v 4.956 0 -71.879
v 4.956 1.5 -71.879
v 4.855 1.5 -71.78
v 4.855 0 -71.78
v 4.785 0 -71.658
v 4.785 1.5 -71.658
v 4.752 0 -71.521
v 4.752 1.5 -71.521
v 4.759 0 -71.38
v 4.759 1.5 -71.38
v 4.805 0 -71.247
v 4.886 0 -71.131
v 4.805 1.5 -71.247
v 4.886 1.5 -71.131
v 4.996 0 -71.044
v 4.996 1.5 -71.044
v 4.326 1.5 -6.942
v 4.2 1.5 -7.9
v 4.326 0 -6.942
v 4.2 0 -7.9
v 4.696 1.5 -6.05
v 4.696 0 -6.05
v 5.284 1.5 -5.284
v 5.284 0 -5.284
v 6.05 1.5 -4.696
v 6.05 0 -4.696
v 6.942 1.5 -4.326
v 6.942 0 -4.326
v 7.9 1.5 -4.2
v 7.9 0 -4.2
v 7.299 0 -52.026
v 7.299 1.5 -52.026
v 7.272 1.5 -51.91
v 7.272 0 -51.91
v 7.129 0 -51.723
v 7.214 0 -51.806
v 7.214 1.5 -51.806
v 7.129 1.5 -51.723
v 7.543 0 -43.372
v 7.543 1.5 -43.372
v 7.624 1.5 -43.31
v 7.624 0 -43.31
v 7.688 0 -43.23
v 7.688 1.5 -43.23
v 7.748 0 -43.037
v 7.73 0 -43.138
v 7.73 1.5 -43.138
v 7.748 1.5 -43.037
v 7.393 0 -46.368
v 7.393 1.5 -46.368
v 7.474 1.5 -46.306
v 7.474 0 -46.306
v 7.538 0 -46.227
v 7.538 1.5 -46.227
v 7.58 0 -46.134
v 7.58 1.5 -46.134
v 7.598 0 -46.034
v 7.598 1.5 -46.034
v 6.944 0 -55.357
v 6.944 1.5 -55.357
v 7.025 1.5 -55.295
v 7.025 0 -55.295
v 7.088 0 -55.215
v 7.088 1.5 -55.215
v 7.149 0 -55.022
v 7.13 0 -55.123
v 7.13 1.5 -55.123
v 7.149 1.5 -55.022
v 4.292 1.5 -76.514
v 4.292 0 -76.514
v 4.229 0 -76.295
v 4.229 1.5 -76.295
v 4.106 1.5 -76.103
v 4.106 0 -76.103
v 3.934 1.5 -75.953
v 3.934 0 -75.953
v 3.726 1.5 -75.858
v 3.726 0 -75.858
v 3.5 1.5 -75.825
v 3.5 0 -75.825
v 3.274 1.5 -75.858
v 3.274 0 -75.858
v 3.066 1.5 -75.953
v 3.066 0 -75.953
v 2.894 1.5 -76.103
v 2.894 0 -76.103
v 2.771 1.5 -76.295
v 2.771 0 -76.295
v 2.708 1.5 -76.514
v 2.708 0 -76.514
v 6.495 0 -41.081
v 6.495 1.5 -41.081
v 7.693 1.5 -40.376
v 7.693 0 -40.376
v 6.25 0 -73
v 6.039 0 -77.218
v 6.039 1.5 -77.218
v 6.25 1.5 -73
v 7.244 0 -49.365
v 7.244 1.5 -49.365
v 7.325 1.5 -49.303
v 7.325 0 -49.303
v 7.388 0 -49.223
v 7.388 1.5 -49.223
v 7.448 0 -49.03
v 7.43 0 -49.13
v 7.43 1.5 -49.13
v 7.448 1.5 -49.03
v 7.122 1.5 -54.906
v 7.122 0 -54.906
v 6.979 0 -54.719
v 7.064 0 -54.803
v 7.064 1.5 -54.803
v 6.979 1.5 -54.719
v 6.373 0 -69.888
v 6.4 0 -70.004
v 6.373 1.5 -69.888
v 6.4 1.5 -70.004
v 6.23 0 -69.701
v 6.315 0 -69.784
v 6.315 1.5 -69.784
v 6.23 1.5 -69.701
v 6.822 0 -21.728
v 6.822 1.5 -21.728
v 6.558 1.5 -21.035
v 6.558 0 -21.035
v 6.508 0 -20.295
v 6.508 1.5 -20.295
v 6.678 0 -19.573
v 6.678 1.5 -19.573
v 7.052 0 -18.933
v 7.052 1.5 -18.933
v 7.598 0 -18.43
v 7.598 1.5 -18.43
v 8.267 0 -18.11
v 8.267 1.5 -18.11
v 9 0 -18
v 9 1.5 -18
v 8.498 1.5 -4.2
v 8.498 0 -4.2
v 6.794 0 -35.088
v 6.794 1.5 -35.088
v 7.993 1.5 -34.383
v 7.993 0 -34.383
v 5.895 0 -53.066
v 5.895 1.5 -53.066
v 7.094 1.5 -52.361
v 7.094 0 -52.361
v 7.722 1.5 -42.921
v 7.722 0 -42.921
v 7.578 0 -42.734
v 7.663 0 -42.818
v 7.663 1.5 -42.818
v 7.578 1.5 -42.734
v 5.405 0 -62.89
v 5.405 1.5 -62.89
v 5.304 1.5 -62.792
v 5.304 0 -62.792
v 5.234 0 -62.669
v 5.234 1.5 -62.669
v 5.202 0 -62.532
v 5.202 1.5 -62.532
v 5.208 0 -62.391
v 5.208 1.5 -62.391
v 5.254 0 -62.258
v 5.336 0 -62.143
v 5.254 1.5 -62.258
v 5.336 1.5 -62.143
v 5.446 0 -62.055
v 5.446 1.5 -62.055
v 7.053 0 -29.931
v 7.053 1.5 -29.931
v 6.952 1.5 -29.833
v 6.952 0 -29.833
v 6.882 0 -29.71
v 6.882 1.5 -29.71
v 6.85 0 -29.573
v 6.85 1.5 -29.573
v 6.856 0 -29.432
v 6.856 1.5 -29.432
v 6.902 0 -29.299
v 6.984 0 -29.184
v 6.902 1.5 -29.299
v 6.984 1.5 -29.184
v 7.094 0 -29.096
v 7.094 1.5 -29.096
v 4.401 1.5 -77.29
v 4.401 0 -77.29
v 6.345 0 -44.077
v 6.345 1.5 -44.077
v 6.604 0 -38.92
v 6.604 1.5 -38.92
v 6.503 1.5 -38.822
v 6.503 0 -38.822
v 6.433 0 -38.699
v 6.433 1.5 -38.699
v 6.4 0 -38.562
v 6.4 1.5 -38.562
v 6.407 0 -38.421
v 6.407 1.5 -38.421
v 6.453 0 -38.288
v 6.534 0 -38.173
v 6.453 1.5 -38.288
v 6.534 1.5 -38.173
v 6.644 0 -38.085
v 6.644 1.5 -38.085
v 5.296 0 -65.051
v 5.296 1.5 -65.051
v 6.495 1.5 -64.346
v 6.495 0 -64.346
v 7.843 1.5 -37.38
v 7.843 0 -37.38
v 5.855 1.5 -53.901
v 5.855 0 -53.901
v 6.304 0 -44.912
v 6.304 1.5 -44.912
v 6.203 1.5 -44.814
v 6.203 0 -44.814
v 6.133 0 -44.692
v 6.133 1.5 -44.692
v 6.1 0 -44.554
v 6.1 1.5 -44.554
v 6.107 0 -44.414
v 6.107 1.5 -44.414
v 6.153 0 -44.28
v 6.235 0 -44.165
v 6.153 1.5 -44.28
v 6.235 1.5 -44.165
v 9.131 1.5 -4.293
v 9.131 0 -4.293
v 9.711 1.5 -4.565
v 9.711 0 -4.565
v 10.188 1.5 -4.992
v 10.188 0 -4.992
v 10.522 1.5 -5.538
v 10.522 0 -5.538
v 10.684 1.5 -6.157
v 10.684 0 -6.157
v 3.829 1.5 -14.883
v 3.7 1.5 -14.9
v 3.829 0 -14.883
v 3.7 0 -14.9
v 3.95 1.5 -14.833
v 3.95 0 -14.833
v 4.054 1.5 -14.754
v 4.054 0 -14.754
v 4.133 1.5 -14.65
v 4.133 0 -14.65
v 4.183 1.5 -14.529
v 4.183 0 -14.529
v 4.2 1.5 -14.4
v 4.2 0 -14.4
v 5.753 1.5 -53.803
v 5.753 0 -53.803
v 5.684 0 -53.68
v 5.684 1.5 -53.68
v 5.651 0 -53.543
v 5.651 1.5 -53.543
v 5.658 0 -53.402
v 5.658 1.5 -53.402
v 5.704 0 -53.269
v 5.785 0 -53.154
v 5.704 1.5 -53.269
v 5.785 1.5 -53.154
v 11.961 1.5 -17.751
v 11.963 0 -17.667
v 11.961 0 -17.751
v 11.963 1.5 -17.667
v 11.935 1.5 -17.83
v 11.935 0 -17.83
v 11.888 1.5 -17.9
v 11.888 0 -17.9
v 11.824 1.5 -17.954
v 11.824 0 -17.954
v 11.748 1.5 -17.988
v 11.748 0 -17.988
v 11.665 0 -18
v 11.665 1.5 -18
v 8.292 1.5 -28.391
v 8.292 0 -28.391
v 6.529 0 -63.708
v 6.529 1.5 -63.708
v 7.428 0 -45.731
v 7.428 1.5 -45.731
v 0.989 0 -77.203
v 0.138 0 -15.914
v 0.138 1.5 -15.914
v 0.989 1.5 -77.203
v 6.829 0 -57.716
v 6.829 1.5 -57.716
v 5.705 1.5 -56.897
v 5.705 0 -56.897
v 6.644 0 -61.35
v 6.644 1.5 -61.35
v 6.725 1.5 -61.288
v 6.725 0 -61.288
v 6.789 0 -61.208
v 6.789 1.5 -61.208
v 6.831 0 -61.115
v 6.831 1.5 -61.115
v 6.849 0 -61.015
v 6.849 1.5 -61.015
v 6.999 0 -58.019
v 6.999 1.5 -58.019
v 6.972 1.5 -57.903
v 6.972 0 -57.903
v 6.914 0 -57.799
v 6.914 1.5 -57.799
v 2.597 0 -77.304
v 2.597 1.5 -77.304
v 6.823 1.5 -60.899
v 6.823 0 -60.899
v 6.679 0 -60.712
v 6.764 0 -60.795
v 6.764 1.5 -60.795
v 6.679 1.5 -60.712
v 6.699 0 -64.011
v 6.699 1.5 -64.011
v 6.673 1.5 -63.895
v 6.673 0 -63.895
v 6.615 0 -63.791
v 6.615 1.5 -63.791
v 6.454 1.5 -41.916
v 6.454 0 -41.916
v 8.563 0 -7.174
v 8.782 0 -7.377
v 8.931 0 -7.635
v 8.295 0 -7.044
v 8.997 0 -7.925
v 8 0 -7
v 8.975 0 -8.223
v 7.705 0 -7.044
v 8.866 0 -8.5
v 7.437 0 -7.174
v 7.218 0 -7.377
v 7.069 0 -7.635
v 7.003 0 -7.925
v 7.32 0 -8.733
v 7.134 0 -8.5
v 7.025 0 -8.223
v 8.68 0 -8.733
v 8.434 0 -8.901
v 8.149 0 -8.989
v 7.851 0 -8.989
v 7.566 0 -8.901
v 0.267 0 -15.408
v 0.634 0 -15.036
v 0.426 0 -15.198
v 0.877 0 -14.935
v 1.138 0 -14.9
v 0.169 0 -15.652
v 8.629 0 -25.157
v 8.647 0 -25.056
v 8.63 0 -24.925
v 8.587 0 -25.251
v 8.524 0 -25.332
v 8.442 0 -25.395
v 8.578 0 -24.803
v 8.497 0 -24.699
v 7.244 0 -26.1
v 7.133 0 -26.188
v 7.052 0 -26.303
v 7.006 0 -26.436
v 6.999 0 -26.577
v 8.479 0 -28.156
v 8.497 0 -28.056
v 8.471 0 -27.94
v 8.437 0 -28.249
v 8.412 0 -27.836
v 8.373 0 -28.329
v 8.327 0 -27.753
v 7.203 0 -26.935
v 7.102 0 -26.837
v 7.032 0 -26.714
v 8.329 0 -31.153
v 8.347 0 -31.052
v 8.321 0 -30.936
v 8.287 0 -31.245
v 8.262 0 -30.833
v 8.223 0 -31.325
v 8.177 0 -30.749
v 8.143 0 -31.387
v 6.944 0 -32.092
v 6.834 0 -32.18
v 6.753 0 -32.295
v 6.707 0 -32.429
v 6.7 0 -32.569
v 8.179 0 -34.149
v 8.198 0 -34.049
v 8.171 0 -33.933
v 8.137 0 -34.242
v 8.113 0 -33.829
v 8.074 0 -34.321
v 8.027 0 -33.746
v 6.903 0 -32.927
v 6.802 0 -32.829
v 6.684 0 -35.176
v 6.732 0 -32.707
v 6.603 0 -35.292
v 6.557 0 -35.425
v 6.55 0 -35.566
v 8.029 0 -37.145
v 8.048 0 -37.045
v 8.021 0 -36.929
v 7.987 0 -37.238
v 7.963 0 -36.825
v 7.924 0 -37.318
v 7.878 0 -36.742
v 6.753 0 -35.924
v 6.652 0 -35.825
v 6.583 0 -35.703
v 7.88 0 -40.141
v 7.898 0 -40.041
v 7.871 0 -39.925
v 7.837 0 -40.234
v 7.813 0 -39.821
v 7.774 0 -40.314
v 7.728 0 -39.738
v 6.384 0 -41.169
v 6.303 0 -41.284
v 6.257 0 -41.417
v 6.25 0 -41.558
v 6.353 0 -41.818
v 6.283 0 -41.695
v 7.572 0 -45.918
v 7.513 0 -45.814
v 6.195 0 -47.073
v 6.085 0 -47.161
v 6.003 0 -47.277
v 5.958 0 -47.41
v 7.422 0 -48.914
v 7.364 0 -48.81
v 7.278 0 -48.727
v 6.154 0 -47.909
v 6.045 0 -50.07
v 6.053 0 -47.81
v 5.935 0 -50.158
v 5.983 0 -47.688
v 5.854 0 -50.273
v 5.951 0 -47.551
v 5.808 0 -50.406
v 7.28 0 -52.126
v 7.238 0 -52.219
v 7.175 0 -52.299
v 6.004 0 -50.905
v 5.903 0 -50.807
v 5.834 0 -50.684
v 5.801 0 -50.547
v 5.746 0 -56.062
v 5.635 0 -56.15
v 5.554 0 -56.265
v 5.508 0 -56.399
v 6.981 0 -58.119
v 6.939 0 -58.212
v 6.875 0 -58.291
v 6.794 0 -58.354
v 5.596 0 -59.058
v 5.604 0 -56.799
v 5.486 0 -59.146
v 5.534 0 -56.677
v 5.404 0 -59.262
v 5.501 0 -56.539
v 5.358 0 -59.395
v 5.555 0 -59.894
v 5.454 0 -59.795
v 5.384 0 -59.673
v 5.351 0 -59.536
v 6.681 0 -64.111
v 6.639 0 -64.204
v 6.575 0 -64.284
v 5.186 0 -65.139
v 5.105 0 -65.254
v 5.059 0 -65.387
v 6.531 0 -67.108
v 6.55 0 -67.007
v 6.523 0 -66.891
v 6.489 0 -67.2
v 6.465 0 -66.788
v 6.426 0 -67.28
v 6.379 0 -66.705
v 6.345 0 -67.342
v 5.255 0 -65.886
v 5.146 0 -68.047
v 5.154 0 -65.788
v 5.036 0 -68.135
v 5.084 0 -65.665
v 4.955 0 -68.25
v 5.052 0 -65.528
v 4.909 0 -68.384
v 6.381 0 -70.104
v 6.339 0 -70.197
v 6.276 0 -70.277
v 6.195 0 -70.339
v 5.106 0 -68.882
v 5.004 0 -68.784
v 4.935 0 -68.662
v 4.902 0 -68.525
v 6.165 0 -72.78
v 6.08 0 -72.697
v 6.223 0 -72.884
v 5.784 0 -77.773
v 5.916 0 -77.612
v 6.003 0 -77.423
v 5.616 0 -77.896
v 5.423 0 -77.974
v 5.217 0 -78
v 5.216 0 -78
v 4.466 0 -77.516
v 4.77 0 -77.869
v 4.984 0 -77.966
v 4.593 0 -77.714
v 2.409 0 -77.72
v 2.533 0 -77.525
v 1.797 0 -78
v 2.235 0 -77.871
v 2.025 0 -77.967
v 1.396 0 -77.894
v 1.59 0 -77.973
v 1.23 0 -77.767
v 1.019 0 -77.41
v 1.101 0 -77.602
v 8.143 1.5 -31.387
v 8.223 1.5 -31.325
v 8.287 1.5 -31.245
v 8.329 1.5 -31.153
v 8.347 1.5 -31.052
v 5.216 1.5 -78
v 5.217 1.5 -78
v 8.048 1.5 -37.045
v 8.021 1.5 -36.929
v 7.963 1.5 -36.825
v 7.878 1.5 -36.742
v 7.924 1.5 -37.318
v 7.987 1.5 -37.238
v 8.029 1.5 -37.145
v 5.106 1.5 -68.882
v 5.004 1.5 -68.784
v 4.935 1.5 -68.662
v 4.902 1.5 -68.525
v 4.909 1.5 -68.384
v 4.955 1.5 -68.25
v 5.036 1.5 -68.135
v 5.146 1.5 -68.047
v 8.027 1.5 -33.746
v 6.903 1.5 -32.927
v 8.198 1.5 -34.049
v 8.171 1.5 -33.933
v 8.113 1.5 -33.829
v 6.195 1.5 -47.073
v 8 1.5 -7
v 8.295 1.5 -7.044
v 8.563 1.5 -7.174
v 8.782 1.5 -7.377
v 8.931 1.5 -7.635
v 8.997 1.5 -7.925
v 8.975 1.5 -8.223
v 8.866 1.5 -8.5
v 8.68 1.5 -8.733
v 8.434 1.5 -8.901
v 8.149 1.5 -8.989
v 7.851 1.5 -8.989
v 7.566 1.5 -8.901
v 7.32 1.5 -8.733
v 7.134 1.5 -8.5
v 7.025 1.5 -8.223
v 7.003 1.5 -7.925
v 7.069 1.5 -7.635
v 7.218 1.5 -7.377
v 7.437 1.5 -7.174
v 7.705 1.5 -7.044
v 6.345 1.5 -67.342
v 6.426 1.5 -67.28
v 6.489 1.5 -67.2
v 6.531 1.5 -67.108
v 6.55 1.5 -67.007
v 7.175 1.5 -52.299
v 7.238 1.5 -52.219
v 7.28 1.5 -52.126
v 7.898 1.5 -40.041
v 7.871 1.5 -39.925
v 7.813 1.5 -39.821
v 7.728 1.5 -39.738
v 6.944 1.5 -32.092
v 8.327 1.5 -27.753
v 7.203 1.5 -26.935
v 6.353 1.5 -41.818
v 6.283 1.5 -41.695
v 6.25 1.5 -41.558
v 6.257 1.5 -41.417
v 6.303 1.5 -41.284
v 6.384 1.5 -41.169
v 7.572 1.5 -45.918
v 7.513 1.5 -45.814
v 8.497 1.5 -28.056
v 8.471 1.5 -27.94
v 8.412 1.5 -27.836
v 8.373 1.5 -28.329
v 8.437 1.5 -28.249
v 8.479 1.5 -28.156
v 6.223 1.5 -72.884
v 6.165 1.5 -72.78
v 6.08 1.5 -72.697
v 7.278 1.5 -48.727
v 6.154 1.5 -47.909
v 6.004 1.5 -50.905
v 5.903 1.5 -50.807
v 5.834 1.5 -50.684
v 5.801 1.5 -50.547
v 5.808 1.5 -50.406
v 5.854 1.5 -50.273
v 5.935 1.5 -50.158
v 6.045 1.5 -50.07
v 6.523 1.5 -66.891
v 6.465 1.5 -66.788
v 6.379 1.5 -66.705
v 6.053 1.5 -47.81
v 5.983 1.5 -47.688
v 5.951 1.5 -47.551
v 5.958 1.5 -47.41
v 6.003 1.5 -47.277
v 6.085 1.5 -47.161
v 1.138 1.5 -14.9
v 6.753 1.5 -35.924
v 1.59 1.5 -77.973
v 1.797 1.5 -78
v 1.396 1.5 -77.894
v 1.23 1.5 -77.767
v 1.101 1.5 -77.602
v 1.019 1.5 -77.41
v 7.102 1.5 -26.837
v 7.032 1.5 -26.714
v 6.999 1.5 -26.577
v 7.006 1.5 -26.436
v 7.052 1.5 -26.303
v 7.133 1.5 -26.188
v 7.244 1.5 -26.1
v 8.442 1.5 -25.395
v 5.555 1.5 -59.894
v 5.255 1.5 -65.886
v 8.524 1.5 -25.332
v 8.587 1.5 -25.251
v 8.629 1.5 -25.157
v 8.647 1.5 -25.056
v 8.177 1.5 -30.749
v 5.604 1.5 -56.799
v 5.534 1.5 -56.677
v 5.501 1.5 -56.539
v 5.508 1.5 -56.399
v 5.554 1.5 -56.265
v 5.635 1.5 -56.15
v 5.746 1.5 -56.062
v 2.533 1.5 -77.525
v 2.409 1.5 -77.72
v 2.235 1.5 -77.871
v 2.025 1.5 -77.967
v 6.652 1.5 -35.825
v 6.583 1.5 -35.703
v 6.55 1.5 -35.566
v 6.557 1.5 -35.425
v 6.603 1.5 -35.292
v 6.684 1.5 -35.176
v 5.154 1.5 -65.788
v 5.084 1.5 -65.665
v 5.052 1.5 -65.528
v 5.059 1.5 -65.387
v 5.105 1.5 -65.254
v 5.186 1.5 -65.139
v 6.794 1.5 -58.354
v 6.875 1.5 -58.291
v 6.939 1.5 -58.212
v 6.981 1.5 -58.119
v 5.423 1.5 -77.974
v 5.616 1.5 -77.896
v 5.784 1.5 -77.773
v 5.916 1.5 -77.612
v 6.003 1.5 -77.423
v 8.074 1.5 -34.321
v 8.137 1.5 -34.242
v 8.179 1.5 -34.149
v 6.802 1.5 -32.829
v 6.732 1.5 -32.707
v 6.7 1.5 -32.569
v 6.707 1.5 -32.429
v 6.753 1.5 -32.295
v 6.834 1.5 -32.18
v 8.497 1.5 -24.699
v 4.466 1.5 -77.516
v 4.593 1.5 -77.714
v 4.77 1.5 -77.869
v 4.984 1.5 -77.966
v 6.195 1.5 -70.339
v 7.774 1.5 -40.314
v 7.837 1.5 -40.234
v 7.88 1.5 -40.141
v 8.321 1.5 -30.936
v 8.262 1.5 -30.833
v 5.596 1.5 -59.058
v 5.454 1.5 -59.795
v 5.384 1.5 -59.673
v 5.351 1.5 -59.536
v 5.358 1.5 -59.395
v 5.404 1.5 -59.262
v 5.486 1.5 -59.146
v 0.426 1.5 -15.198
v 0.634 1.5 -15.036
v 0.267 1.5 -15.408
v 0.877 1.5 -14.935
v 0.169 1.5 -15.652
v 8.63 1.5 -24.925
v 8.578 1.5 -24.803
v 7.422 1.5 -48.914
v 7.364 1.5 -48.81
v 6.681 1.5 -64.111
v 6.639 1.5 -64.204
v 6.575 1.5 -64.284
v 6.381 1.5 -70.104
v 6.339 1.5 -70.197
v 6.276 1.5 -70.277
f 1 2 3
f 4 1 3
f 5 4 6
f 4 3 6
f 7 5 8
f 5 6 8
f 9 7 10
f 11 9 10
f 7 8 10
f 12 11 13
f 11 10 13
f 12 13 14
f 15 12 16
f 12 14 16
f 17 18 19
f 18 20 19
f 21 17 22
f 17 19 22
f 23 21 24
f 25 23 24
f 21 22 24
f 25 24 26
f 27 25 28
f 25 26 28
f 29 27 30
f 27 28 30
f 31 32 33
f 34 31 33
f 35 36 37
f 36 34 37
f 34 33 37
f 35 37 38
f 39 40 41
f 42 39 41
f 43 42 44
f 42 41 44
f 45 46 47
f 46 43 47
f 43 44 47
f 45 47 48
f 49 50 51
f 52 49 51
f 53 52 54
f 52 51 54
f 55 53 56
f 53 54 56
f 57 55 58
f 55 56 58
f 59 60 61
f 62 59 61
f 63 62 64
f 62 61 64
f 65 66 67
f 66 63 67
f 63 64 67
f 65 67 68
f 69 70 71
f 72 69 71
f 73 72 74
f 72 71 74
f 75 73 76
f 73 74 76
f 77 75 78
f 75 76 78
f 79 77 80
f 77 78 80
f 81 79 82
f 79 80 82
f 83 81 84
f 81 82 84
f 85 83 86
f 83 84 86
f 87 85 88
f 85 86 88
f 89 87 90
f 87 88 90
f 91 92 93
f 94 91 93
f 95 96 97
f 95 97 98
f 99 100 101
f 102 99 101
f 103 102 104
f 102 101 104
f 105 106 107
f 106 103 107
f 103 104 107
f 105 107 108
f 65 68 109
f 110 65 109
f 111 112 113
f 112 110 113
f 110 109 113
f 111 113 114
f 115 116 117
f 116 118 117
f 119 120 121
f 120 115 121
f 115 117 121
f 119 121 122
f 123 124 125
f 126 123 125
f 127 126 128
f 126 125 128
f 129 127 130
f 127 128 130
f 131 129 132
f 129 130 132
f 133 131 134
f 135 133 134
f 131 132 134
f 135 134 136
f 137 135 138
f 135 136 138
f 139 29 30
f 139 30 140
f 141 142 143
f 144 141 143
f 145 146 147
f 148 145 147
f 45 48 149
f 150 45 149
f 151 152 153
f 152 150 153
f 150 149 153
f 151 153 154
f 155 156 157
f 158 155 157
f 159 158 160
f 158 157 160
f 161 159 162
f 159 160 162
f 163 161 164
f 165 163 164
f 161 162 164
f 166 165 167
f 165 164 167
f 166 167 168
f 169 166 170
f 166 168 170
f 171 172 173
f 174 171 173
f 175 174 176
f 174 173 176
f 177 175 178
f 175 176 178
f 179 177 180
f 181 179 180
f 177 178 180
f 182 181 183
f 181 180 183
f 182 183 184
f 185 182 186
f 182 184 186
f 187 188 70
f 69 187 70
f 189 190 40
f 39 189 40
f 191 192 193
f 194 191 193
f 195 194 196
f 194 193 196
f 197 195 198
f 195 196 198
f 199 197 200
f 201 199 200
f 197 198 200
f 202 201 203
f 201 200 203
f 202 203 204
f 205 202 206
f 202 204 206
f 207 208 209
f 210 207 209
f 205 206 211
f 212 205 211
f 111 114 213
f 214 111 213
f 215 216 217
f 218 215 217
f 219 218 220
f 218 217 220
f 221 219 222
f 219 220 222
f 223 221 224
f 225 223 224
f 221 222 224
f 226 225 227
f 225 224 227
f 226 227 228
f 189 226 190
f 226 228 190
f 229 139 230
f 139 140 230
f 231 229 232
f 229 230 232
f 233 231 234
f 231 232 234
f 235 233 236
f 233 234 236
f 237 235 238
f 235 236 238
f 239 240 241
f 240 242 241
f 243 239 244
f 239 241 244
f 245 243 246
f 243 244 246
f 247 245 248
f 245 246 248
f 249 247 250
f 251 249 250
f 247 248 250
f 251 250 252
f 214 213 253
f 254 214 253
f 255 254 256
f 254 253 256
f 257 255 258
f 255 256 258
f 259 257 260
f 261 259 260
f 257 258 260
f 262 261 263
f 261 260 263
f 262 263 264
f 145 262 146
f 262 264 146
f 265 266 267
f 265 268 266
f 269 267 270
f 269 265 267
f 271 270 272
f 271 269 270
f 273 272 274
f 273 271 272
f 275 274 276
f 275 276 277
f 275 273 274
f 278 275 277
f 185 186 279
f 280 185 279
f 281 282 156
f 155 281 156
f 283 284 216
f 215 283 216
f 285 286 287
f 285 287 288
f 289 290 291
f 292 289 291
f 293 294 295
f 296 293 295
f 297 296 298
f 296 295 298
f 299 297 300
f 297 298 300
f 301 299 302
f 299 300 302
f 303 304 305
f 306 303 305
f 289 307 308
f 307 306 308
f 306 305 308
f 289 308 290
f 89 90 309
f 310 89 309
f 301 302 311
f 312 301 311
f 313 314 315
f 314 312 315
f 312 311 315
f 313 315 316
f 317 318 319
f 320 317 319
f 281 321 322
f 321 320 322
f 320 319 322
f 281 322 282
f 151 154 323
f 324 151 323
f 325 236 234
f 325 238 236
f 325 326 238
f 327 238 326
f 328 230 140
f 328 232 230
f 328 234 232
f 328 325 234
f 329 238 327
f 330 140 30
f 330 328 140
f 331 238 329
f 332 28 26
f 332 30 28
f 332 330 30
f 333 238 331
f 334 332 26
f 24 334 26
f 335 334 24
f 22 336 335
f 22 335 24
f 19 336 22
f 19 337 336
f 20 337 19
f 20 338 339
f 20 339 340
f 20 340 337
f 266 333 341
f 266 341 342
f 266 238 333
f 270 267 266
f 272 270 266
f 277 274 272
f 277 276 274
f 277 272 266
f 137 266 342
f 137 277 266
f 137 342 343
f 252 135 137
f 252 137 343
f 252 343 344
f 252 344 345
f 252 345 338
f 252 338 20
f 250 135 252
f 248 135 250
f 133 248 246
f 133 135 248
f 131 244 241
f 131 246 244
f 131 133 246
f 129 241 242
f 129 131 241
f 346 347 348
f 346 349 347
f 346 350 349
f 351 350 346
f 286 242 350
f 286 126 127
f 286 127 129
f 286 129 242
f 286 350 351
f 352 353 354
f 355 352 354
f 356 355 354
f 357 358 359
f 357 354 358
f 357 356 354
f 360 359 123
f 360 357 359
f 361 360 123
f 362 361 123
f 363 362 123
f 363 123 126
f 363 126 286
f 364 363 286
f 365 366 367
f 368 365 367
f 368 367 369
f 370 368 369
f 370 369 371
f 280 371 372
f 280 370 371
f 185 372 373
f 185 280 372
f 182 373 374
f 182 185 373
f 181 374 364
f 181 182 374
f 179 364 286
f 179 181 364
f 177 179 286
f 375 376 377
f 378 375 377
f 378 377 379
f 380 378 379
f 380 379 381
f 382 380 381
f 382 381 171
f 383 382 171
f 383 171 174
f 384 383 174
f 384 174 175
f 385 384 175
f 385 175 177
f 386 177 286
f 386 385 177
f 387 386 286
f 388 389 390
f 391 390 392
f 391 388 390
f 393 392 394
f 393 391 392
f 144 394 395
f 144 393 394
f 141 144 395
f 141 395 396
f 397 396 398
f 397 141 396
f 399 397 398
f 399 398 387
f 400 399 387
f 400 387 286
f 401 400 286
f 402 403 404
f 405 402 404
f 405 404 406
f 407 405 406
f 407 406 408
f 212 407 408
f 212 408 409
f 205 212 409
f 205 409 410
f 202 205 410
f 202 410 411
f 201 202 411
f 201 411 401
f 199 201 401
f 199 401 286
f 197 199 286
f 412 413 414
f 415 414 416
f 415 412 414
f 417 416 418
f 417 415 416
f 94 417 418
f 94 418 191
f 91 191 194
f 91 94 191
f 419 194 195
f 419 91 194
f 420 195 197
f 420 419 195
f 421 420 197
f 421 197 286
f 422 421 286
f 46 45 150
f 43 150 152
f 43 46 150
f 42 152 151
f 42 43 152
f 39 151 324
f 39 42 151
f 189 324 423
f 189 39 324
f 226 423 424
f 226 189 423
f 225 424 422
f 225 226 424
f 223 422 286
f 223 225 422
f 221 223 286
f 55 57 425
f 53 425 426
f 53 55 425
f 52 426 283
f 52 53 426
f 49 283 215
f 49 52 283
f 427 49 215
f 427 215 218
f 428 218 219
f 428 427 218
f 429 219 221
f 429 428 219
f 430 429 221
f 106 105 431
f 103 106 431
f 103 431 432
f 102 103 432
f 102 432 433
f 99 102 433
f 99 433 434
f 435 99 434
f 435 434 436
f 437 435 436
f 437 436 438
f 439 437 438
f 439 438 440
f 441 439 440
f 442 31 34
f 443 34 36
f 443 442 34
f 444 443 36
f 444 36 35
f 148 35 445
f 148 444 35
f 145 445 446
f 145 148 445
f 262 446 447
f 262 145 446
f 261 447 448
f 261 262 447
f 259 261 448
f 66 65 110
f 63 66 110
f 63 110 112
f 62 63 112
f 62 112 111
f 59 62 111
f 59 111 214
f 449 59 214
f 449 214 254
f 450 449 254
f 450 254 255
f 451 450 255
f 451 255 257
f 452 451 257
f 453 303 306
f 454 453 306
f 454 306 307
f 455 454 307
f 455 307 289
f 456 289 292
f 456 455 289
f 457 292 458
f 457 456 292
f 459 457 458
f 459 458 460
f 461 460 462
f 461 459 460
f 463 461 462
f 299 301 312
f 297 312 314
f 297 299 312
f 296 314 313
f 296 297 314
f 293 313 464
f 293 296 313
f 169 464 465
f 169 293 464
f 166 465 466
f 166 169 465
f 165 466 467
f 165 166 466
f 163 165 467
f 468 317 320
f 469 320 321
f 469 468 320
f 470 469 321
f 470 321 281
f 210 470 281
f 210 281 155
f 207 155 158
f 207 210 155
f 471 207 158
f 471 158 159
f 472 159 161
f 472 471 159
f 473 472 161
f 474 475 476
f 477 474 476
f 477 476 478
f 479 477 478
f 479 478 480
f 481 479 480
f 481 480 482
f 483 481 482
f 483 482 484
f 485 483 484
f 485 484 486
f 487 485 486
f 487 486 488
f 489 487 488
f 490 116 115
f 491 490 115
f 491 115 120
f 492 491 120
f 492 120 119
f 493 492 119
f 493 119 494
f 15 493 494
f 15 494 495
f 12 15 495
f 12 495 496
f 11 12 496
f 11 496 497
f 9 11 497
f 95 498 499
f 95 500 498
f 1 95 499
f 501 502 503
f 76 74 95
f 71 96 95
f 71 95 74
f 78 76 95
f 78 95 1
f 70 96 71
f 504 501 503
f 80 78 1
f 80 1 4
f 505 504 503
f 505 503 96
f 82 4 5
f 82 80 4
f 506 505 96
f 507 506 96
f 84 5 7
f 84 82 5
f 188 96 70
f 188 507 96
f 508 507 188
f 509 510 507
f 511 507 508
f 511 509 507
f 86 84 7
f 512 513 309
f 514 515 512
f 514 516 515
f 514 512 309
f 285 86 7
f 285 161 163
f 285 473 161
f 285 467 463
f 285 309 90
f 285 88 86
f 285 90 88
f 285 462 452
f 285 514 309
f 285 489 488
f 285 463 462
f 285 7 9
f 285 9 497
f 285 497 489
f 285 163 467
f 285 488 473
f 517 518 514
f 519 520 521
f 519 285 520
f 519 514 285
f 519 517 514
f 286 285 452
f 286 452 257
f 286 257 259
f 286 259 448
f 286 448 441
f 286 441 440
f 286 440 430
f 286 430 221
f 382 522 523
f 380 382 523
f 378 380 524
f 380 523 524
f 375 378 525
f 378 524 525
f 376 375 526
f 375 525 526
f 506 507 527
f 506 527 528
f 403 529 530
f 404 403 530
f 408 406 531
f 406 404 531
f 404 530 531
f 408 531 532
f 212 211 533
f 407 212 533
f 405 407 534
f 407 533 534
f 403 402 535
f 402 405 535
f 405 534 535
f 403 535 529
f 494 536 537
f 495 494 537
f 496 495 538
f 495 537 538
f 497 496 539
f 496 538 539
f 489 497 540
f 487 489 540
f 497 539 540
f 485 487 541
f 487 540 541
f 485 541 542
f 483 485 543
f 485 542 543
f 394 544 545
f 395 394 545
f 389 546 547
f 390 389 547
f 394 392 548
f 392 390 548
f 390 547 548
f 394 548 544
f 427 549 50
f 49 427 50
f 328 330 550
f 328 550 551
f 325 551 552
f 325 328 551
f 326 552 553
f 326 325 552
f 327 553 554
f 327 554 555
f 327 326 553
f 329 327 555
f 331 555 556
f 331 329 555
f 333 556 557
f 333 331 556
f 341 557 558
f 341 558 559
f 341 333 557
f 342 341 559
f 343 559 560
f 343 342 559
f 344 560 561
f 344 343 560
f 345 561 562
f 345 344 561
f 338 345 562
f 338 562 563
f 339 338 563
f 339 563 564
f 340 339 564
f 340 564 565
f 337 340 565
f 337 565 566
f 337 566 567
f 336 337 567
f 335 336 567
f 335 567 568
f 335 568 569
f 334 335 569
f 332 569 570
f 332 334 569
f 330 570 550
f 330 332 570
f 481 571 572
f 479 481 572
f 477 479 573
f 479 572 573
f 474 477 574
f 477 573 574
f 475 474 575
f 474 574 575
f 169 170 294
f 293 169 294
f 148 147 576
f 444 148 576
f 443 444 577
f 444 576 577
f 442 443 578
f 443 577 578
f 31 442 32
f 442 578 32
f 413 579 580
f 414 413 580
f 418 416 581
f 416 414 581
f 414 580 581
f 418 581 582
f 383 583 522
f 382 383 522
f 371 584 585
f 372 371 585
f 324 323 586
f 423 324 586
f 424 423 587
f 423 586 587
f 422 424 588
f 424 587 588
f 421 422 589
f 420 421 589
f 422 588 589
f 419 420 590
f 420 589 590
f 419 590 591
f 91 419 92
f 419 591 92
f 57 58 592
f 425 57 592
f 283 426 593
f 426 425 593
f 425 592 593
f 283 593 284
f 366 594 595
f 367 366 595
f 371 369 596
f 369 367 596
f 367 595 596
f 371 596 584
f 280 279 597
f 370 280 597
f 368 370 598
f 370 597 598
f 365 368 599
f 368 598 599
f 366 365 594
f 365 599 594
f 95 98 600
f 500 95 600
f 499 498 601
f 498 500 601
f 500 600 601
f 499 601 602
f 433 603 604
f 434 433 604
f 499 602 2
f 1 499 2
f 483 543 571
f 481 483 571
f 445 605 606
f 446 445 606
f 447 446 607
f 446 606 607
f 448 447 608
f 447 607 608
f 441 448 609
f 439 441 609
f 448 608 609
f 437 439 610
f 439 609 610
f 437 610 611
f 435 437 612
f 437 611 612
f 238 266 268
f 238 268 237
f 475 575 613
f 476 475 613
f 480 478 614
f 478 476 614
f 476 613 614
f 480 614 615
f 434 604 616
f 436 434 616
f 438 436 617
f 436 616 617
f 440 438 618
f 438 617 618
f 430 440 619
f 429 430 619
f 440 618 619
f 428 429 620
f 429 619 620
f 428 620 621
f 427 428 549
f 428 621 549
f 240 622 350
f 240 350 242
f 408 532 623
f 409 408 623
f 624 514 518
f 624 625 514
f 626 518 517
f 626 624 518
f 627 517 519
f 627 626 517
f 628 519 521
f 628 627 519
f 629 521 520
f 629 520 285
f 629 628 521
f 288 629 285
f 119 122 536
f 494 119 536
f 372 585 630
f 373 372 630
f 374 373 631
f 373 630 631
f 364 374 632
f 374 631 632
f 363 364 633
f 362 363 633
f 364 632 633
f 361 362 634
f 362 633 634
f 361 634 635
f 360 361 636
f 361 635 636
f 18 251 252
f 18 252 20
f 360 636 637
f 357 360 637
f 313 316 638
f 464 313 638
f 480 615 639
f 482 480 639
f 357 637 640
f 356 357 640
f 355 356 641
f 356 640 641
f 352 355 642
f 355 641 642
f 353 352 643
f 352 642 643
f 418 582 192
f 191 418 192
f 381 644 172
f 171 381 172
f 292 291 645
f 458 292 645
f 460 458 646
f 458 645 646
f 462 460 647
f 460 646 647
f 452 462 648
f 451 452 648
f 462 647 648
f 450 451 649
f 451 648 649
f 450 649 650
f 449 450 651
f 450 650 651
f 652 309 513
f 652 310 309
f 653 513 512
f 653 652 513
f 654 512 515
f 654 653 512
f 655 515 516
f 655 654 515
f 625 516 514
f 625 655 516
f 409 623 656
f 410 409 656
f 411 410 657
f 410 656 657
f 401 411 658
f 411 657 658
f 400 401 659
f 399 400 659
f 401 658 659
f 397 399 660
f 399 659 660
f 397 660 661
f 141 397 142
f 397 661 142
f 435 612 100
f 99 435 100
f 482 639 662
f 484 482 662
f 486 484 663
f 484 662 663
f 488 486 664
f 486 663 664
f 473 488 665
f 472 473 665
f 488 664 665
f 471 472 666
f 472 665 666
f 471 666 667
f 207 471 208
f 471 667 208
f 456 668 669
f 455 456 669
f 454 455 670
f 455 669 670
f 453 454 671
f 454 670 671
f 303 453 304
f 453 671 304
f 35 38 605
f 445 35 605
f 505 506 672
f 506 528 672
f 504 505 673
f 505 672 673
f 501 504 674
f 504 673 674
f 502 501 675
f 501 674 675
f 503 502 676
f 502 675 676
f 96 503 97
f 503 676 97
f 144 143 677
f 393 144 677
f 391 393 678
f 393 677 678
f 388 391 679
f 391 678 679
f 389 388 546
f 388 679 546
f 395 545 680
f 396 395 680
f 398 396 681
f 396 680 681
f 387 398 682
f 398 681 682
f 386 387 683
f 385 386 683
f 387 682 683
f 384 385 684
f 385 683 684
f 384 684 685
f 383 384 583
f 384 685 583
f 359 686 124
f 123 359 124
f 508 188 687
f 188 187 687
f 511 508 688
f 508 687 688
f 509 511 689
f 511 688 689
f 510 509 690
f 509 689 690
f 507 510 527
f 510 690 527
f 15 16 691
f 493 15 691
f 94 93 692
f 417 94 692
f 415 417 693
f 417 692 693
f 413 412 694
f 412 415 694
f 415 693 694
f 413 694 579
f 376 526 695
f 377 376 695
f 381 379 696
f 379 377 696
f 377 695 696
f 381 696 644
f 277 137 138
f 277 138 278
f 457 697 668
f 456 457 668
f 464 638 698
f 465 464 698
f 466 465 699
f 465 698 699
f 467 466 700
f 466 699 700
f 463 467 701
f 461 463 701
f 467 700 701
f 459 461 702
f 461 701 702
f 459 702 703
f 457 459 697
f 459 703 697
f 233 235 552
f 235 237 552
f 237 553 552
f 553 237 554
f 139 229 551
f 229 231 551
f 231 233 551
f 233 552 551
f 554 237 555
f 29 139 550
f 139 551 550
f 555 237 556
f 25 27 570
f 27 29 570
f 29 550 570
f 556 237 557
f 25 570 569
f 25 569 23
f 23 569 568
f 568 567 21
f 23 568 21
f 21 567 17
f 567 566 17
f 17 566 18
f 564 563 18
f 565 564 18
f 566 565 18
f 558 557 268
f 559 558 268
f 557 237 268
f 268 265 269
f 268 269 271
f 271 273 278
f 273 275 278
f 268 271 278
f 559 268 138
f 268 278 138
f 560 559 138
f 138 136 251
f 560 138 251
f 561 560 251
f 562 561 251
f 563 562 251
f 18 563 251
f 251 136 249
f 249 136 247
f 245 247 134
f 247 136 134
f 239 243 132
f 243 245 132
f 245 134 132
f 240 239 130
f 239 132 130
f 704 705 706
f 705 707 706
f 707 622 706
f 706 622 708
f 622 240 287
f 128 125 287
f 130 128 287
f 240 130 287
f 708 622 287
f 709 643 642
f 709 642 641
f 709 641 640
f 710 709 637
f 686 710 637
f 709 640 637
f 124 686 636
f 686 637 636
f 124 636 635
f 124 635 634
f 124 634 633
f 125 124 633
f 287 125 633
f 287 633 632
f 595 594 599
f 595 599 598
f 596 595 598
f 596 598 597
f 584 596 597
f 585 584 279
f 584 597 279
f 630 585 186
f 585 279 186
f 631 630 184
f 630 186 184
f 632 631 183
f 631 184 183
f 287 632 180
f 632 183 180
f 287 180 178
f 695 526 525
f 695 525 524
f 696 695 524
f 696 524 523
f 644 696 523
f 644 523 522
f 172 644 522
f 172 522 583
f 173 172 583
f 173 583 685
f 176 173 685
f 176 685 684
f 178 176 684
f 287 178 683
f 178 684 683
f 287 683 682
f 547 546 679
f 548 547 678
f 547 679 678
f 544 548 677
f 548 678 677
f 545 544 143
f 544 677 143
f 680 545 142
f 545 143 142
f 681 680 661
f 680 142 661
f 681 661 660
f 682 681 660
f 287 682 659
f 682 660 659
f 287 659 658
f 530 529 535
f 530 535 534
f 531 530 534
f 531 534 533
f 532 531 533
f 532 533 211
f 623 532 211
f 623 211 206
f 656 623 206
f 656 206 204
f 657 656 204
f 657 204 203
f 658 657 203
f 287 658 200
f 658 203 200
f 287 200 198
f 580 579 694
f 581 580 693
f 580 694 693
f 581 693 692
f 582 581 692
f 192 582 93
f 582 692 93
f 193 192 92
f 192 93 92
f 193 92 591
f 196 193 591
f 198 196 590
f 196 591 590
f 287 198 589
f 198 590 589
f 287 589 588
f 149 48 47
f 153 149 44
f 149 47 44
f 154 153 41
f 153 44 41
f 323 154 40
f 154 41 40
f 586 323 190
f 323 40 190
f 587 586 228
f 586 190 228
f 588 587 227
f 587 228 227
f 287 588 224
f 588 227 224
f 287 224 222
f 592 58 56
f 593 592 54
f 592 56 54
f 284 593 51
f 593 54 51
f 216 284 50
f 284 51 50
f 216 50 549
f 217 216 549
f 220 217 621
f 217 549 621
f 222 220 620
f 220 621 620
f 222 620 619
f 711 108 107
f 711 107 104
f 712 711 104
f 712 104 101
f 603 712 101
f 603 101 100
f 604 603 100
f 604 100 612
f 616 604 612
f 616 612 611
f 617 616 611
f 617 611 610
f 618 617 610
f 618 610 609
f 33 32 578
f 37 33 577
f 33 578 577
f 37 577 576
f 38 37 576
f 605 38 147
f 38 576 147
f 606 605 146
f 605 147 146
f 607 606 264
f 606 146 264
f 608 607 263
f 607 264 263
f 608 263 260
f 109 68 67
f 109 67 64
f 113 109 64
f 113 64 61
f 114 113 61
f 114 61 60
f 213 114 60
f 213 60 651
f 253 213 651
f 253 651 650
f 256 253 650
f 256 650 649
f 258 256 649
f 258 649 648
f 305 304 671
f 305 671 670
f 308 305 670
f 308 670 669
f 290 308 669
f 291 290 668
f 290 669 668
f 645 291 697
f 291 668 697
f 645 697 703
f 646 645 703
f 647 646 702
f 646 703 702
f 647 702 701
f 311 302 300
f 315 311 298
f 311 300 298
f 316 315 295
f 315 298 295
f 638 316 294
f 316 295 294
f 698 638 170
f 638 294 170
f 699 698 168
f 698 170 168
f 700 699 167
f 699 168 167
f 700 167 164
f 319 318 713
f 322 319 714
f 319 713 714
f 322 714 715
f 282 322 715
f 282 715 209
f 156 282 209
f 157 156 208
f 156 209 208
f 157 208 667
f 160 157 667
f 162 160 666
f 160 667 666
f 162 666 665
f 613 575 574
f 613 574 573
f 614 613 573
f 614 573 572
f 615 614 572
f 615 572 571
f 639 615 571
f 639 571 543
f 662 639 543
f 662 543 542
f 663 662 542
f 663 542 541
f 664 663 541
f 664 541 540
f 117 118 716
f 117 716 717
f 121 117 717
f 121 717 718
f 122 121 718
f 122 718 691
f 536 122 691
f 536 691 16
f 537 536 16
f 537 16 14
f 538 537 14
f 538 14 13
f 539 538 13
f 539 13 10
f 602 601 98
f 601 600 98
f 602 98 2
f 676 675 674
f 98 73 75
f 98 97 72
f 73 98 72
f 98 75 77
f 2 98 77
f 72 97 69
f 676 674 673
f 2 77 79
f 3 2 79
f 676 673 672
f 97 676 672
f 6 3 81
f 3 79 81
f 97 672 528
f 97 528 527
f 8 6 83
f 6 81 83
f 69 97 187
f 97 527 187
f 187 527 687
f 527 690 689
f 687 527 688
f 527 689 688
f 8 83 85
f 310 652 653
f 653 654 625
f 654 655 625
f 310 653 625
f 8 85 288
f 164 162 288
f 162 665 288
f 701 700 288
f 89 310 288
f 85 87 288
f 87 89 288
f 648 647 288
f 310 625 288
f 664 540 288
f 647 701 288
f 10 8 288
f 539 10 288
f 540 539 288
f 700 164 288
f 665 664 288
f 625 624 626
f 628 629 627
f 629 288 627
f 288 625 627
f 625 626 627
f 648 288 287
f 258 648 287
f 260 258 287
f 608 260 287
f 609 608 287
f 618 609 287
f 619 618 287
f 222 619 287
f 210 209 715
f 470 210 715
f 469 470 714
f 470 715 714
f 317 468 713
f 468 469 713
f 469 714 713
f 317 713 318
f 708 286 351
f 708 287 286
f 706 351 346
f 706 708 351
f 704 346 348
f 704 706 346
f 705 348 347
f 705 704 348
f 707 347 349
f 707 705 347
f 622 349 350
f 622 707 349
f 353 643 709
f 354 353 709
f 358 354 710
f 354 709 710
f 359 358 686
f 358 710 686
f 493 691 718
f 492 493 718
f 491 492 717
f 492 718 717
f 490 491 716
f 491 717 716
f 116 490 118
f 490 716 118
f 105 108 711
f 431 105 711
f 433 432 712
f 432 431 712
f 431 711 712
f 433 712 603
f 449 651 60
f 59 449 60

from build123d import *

# Parameters (mm, degrees)
SKETCH1_R           = 1
BOSS_EXTRUDE1_DEPTH = 1.5
FILLET1_R           = 3
CUT_EXTRUDE1_DEPTH  = 79.931932702
LPATTERN1_COUNT     = 16
LPATTERN1_PITCH     = 3
CUT_EXTRUDE2_DEPTH  = 79.931932702
FILLET2_R           = 0.3
CUT_EXTRUDE3_DEPTH  = 5
FILLET3_R           = 0.808139
FILLET4_R           = 0.823652
CUT_EXTRUDE4_DEPTH  = 1.6
FILLET10_R          = 1
FILLET11_R          = 0.5
FILLET13_R          = 3.7
FILLET14_R          = 2.2


with BuildPart() as part:
    # Sketch1 → Boss-Extrude1 (new body)
    with BuildSketch(Plane(origin=(0, 0, 0), x_dir=(1, 0, 0), z_dir=(0, 1, 0))):
        Polygon((0, 0), (0, 6), (1, 78), (6, 78), (9, 18), (12, 18), (10, 0), align=None)
        with Locations(Location((8, 8, 0), (0, 0, 270))):
            Circle(SKETCH1_R, mode=Mode.SUBTRACT)
    extrude(amount=BOSS_EXTRUDE1_DEPTH)

    # Fillet1
    fillet1_edges = [part.edges().sort_by_distance(p)[0] for p in [
        (10, 0.75, 0),
    ]]
    fillet(fillet1_edges, radius=FILLET1_R)

    # Sketch2 → Cut-Extrude1 (cut, symmetric)
    with BuildSketch(Plane(origin=(0, 1.5, 0), x_dir=(1, 0, 0), z_dir=(0, 1, 0))):
        with BuildLine():
            ThreePointArc((4.955729038, 71.878708516), (4.750594632, 71.450097336), (4.996498521, 71.04350301))
            Line((4.996498521, 71.04350301), (6.194975811, 70.338548499))
            ThreePointArc((6.194975811, 70.338548499), (6.340221232, 70.195153453), (6.4, 70))
            Line((6.4, 70), (6.25, 73))
            ThreePointArc((6.25, 73), (6.19798995, 72.829948537), (6.079849196, 72.697037636))
            Line((6.079849196, 72.697037636), (4.955729038, 71.878708516))
        make_face()
    cut_extrude1 = extrude(amount=CUT_EXTRUDE1_DEPTH, both=True, mode=Mode.SUBTRACT)

    # LPattern1: Cut-Extrude1 ×16
    with Locations(*[Vector(0.0499376169438922, 0, 0.9987523388778448) * (i * LPATTERN1_PITCH) for i in range(1, LPATTERN1_COUNT)]):
        add(cut_extrude1, mode=Mode.SUBTRACT)

    # Sketch3 → Cut-Extrude2 (cut, through all)
    with BuildSketch(Plane(origin=(0, 1.5, 0), x_dir=(1, 0, 0), z_dir=(0, 1, 0))):
        with BuildLine():
            Line((8.496742185, 24.698632232), (6.822120402, 21.727534299))
            ThreePointArc((6.822120402, 21.727534299), (6.841431522, 19.238817172), (9, 18))
            Line((9, 18), (8.647192762, 25.05614475))
            ThreePointArc((8.647192762, 25.05614475), (8.608047789, 24.862204955), (8.496742185, 24.698632232))
        make_face()
    extrude(amount=-CUT_EXTRUDE2_DEPTH, mode=Mode.SUBTRACT)

    # Fillet2
    fillet2_edges = [part.edges().sort_by_distance(p)[0] for p in [
        (12, 0.75, -18),
    ]]
    fillet(fillet2_edges, radius=FILLET2_R)

    # Sketch16 → Cut-Extrude3 (cut)
    with BuildSketch(Plane.XZ):
        with BuildLine():
            Line((6, -78), (4.5, -78))
            Line((4.5, -78), (4.292293166, -76.514450313))
            ThreePointArc((4.292293166, -76.514450313), (3.5, -75.825227292), (2.707706834, -76.514450313))
            Line((2.707706834, -76.514450313), (2.5, -78))
            Line((2.5, -78), (1, -78))
            Line((1, -78), (1, -78.416520576))
            Line((1, -78.416520576), (6, -78.416520576))
            Line((6, -78.416520576), (6, -78))
        make_face()
    extrude(amount=-CUT_EXTRUDE3_DEPTH, mode=Mode.SUBTRACT)

    # Fillet3
    fillet3_edges = [part.edges().sort_by_distance(p)[0] for p in [
        (1, 0.75, -78),
        (2.5, 0.75, -78),
    ]]
    fillet(fillet3_edges, radius=FILLET3_R - 0.0001)  # a hair under: the kernel refuses the full size

    # Fillet4
    fillet4_edges = [part.edges().sort_by_distance(p)[0] for p in [
        (6, 0.75, -78),
        (4.5, 0.75, -78),
    ]]
    fillet(fillet4_edges, radius=FILLET4_R - 0.0001)  # a hair under: the kernel refuses the full size

    # Sketch15 → Cut-Extrude4 (cut)
    with BuildSketch(Plane(origin=(0, 1.5, 0), x_dir=(1, 0, 0), z_dir=(0, 1, 0))):
        Polygon((4.2, 14.9), (4.2, 4.2), (11.363579638, 4.2), (10.97286707, 0), (4.2, 0), (0, 0), (0, 14.9), align=None)
    extrude(amount=-CUT_EXTRUDE4_DEPTH, mode=Mode.SUBTRACT)

    # Fillet10
    fillet10_edges = [part.edges().sort_by_distance(p)[0] for p in [
        (0.123611111, 0.75, -14.9),
    ]]
    fillet(fillet10_edges, radius=FILLET10_R)

    # Fillet11
    fillet11_edges = [part.edges().sort_by_distance(p)[0] for p in [
        (4.2, 0.75, -14.9),
    ]]
    fillet(fillet11_edges, radius=FILLET11_R)

    # Fillet13
    fillet13_edges = [part.edges().sort_by_distance(p)[0] for p in [
        (4.2, 0.75, -4.2),
    ]]
    fillet(fillet13_edges, radius=FILLET13_R)

    # Fillet14
    fillet14_edges = [part.edges().sort_by_distance(p)[0] for p in [
        (10.466666667, 0.75, -4.2),
    ]]
    fillet(fillet14_edges, radius=FILLET14_R)


solid = part.part
